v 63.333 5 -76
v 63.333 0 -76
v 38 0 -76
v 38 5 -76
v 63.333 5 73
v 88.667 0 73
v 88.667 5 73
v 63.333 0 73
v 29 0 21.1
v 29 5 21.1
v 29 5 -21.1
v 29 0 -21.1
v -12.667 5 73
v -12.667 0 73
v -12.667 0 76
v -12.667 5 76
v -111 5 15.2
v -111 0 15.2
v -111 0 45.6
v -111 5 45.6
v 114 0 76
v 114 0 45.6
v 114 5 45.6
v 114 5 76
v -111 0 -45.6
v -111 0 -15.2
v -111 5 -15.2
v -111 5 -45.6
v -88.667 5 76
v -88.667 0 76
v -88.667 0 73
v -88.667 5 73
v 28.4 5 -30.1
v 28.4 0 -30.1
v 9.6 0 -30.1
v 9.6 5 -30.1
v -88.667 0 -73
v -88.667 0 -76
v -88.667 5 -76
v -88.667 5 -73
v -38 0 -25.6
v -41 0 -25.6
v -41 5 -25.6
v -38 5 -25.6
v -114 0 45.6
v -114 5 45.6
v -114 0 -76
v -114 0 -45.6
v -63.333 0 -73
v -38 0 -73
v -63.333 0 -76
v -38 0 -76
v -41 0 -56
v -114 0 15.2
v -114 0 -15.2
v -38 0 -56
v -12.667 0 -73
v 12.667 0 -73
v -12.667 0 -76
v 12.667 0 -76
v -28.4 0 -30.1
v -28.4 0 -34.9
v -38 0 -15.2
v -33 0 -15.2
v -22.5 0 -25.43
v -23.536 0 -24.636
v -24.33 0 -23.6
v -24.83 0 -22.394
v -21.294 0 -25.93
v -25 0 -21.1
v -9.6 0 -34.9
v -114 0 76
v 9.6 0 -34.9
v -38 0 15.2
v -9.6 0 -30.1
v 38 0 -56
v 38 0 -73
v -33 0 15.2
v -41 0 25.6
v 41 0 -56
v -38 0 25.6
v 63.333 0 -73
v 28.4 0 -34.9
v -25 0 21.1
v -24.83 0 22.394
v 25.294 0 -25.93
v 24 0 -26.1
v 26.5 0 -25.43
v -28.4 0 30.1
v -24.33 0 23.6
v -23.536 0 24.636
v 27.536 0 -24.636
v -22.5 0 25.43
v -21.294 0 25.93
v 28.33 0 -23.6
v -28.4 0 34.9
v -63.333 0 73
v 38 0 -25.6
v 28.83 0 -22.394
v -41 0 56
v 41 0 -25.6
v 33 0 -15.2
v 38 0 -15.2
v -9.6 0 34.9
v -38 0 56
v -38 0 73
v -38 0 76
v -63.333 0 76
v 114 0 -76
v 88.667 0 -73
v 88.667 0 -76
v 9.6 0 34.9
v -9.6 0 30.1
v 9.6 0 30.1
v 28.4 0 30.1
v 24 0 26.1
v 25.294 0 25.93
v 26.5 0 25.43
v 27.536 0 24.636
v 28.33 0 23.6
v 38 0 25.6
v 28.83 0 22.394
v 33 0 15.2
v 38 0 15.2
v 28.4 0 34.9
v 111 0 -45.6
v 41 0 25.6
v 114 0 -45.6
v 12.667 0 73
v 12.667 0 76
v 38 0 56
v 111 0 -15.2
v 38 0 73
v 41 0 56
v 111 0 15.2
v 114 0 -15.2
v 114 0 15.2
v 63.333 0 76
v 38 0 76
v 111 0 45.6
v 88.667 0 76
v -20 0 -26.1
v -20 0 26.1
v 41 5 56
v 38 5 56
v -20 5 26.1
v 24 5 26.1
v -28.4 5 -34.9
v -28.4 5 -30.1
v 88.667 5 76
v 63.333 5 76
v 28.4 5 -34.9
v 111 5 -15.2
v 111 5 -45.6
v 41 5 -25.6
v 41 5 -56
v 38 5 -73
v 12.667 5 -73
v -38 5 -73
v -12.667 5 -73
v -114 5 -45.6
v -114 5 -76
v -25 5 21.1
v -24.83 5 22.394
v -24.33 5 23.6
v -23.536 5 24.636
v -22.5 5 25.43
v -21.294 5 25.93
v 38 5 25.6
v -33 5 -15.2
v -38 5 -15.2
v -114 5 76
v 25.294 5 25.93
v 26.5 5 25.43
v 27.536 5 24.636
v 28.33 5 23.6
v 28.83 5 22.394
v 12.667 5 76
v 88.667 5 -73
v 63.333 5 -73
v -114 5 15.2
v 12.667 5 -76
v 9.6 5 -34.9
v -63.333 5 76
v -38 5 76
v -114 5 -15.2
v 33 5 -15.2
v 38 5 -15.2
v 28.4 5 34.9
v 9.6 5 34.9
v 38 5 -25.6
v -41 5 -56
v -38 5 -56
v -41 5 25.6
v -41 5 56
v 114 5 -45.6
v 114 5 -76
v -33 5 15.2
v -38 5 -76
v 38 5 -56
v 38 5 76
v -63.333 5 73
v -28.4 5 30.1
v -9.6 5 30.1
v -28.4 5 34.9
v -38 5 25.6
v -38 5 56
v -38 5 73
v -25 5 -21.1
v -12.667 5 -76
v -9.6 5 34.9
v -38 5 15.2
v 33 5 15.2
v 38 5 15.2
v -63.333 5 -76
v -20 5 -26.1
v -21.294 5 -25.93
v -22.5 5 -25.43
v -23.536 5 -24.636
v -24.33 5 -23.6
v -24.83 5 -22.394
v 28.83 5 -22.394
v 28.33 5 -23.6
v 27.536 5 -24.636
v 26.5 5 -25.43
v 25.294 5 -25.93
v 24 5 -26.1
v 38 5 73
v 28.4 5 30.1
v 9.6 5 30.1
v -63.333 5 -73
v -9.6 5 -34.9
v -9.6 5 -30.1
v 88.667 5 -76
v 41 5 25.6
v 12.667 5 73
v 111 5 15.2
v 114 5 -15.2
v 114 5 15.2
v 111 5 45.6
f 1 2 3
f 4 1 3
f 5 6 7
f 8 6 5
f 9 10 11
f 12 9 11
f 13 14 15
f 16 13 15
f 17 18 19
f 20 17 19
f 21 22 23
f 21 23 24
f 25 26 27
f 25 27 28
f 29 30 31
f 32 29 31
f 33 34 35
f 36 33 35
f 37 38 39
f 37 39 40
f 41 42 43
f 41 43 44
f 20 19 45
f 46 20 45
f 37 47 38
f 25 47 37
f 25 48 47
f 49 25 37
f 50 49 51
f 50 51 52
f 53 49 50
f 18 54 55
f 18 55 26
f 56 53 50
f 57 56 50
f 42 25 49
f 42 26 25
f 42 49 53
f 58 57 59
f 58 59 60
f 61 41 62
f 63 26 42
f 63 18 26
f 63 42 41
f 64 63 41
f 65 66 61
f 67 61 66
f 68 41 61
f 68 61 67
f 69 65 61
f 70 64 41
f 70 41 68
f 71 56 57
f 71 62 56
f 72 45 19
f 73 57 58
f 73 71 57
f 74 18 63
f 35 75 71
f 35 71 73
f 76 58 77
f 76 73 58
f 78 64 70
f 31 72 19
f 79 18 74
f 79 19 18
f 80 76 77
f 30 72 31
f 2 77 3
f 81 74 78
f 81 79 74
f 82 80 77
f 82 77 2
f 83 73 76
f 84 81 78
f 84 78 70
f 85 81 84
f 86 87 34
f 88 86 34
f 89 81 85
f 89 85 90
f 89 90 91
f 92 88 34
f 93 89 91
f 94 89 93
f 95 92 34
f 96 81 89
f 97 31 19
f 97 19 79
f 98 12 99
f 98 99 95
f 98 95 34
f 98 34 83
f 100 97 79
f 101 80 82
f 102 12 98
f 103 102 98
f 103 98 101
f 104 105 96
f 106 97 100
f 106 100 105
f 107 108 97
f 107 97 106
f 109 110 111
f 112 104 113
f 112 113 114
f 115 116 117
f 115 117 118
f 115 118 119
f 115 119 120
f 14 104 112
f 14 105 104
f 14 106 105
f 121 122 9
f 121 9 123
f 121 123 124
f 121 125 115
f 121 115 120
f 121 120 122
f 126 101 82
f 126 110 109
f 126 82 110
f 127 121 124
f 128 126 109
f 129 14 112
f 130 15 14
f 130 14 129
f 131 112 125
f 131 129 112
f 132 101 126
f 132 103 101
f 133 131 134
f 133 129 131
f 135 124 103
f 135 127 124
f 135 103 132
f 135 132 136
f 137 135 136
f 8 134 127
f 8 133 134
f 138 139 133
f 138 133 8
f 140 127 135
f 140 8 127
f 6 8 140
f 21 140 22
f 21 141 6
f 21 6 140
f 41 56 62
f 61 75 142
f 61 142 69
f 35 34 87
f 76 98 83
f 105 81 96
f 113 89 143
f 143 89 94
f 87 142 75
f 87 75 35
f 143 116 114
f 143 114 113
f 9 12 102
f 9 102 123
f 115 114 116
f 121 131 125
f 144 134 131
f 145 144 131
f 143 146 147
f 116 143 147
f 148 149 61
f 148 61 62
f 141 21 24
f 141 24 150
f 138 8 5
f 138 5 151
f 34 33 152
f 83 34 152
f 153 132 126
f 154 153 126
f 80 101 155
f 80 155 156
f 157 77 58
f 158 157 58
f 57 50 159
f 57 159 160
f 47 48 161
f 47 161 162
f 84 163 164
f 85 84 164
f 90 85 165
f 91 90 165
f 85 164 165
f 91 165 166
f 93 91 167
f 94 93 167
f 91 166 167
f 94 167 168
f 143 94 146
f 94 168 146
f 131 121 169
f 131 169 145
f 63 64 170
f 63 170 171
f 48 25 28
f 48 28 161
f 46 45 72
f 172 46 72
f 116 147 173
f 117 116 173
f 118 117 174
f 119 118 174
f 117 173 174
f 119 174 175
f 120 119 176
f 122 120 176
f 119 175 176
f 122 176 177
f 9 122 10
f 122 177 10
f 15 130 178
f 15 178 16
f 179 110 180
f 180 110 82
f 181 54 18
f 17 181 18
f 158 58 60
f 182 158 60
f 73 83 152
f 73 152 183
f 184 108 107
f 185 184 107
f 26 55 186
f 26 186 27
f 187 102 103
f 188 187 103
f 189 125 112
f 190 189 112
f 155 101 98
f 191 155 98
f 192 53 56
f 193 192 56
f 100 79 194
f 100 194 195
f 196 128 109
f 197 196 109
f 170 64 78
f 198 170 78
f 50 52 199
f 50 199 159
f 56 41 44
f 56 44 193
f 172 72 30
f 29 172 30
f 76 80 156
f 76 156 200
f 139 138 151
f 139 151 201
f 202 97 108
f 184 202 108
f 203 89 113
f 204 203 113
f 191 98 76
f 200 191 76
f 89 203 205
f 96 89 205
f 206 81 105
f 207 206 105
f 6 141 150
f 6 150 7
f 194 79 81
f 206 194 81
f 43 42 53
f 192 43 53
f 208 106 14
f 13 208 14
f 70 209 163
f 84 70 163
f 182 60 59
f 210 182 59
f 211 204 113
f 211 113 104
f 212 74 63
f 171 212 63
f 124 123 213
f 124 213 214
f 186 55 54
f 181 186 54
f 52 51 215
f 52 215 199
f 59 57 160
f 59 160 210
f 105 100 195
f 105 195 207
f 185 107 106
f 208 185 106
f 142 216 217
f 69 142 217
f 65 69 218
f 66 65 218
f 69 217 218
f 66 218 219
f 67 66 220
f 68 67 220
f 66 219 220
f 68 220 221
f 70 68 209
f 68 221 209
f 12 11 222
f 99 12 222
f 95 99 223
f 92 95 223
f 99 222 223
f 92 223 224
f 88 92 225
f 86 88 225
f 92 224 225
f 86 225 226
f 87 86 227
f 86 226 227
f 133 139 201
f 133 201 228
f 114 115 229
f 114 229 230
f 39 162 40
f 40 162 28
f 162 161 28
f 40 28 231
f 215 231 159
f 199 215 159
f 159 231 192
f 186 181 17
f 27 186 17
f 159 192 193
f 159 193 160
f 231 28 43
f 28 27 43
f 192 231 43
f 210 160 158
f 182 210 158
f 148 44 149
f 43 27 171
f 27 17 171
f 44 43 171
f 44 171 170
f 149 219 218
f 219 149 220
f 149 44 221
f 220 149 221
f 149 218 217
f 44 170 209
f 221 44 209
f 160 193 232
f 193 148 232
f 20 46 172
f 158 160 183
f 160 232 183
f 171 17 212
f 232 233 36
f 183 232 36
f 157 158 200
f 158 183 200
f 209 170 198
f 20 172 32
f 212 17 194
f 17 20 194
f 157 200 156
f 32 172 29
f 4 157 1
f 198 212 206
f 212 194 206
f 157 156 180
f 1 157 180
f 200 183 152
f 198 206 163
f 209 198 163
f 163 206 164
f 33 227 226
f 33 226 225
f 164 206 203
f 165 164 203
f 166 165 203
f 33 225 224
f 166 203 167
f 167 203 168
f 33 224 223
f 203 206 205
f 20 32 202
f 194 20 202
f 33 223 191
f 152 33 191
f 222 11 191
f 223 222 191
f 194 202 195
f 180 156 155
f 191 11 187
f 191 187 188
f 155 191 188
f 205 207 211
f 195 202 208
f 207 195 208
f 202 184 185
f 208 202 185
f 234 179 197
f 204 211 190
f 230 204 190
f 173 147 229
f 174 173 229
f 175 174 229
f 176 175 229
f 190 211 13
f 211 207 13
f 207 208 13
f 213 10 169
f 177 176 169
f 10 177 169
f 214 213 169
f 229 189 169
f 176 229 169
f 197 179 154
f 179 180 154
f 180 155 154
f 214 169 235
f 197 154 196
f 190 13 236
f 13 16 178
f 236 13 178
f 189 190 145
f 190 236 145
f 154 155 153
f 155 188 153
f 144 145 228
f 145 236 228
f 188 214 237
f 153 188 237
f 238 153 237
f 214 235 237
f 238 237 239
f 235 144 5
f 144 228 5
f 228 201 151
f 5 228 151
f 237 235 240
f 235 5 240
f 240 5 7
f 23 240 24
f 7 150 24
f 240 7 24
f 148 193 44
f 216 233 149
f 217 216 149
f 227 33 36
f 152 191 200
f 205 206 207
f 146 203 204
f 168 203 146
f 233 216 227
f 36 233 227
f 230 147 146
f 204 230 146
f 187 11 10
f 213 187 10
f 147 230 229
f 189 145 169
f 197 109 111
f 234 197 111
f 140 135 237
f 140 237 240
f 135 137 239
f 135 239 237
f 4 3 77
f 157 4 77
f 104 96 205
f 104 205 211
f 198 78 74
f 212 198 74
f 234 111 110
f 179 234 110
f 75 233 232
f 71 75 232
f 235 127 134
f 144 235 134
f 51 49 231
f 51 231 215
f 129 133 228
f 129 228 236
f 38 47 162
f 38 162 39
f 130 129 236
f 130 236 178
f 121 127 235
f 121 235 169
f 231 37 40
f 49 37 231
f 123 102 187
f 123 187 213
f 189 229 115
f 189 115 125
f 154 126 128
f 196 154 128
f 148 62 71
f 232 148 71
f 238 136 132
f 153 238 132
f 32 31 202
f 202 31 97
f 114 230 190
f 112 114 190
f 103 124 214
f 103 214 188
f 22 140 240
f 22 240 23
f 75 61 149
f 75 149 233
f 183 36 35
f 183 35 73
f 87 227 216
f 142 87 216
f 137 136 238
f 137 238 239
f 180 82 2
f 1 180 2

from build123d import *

# Parameters (mm, degrees)
SKETCH1_W           = 3
SKETCH1_H           = 30.4
SKETCH1_W_2         = 18.8
SKETCH1_H_2         = 4.8
BOSS_EXTRUDE1_DEPTH = 5
CUT_EXTRUDE1_DEPTH  = 138.102151697


with BuildPart() as part:
    # Sketch1 → Boss-Extrude1 (new body)
    with BuildSketch(Plane(origin=(0, 0, 0), x_dir=(1, 0, 0), z_dir=(0, 1, 0))):
        Polygon((-114, 0), (-114, 15.2), (-111, 15.2), (-111, 45.6), (-114, 45.6), (-114, 76), (-88.666666667, 76), (-88.666666667, 73), (-63.333333333, 73), (-63.333333333, 76), (-38, 76), (-38, 73), (-12.666666667, 73), (-12.666666667, 76), (0, 76), (0, 0), (-33, 0), (-33, 15.2), (-38, 15.2), (-38, 0), align=None)
        with Locations((-39.5, 40.8)):
            Rectangle(SKETCH1_W, SKETCH1_H, mode=Mode.SUBTRACT)
        with Locations((-19, 32.5)):
            Rectangle(SKETCH1_W_2, SKETCH1_H_2, mode=Mode.SUBTRACT)
    boss_extrude1 = extrude(amount=BOSS_EXTRUDE1_DEPTH)

    # Mirror1: Boss-Extrude1 across plane
    add(boss_extrude1.mirror(Plane(origin=(-114, 5, 0), x_dir=(1, 0, 0), z_dir=(0, 0, -1))))

    # Mirror6: part across plane


with BuildPart() as part_1:
    add(part.part)
    add(part.part.mirror(Plane(origin=(0, 5, 0), x_dir=(0, 0, 1), z_dir=(-1, 0, 0))))

    # Sketch2 → Cut-Extrude1 (cut, through all)
    with BuildSketch(Plane(origin=(0, 5, 0), x_dir=(1, 0, 0), z_dir=(0, 1, 0))):
        with BuildLine():
            Line((24, 26.1), (-20, 26.1))
            ThreePointArc((-20, 26.1), (-23.535533906, 24.635533906), (-25, 21.1))
            Line((-25, 21.1), (-25, -21.1))
            ThreePointArc((-25, -21.1), (-23.535533906, -24.635533906), (-20, -26.1))
            Line((-20, -26.1), (24, -26.1))
            ThreePointArc((24, -26.1), (27.535533906, -24.635533906), (29, -21.1))
            Line((29, -21.1), (29, 21.1))
            ThreePointArc((29, 21.1), (27.535533906, 24.635533906), (24, 26.1))
        make_face()
    extrude(amount=-CUT_EXTRUDE1_DEPTH, mode=Mode.SUBTRACT)


solid = part_1.part
